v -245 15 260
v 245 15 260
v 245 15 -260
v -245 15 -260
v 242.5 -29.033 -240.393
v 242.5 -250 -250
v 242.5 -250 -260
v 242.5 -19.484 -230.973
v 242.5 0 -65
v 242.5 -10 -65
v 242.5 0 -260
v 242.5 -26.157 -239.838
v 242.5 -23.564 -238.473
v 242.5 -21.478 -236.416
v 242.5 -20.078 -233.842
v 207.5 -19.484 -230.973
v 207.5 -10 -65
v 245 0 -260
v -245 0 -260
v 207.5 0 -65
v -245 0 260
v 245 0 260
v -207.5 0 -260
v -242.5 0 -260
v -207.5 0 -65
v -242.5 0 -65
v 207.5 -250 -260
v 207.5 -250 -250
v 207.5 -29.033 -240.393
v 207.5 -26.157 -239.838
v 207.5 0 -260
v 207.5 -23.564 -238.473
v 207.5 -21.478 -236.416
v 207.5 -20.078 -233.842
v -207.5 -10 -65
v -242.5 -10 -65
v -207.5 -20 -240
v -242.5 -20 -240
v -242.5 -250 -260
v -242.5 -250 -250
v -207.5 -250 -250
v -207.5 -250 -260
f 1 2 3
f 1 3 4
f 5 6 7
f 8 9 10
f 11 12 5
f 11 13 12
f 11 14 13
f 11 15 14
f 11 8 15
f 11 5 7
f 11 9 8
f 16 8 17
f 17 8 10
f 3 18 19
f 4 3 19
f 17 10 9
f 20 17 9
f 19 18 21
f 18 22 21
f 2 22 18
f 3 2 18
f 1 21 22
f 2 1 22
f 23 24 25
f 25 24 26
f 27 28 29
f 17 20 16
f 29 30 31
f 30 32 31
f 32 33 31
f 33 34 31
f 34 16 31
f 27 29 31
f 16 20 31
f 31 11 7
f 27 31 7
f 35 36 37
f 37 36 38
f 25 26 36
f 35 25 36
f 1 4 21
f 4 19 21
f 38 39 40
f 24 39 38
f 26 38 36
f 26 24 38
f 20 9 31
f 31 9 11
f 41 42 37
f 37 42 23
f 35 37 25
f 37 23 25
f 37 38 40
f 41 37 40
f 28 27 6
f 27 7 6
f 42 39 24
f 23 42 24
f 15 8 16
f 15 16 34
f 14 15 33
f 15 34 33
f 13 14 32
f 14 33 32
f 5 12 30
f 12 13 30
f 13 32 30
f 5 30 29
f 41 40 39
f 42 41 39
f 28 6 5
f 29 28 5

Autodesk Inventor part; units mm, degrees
ref_plane "YZ Plane" through (0, 0, 0) normal (1, 0, 0) x (0, 1, 0)
sketch "Sketch1" plane through (0, 0, 0) normal (0, 1, 0) x (-1, 0, 0)
  line L0 (245, 260) -> (-245, 260)
  line L1 (-245, 260) -> (-245, -260)
  line L2 (-245, -260) -> (245, -260)
  line L3 (245, -260) -> (245, 260)
  line L4 (245, 260) -> (-245, -260) construction
  line L5 (-245, 260) -> (245, -260) construction
  point P0 (0, 0)
  dimension "d0" = 490
  dimension "d1" = 520
extrude "Extrusion1" add sketch "Sketch1" along normal blind 15
ref_plane "Work Plane1" through (242.5, 0, 260) normal (1, 0, 0) x (0, 0, -1)
sketch "Sketch2" plane through (242.5, 0, 260) normal (1, 0, 0) x (0, 0, -1)
  line L0 (0, 0) -> (520, 0) projected
  line L1 (520, 0) -> (520, -250)
  line L2 (520, -250) -> (510, -250)
  line L3 (510, -250) -> (500, -20)
  line L4 (500, -20) -> (325, -10)
  line L5 (325, -10) -> (325, 0)
  line L6 (520, 0) -> (325, 0)
  line L7 (500, -20) -> (500, 0) construction
  line L8 (500, -20) -> (520, -20) construction
  point P0 (260, 0)
  dimension "d5" = 10
  dimension "d6" = 20
  dimension "d7" = 195
  dimension "d8" = 250
extrude "Extrusion2" add sketch "Sketch2" against normal blind 35 separate body
fillet "Fillet1" radius 10 1 edges at (225, -20, -240)
ref_plane "Work Plane2" through (0, 0, 260) normal (1, 0, 0) x (0, 0, -1)
mirror "Mirror1" about plane through (0, 0, 260) normal (1, 0, 0) of "Extrusion2" bodies 2
properties part number "ShedDesk"
